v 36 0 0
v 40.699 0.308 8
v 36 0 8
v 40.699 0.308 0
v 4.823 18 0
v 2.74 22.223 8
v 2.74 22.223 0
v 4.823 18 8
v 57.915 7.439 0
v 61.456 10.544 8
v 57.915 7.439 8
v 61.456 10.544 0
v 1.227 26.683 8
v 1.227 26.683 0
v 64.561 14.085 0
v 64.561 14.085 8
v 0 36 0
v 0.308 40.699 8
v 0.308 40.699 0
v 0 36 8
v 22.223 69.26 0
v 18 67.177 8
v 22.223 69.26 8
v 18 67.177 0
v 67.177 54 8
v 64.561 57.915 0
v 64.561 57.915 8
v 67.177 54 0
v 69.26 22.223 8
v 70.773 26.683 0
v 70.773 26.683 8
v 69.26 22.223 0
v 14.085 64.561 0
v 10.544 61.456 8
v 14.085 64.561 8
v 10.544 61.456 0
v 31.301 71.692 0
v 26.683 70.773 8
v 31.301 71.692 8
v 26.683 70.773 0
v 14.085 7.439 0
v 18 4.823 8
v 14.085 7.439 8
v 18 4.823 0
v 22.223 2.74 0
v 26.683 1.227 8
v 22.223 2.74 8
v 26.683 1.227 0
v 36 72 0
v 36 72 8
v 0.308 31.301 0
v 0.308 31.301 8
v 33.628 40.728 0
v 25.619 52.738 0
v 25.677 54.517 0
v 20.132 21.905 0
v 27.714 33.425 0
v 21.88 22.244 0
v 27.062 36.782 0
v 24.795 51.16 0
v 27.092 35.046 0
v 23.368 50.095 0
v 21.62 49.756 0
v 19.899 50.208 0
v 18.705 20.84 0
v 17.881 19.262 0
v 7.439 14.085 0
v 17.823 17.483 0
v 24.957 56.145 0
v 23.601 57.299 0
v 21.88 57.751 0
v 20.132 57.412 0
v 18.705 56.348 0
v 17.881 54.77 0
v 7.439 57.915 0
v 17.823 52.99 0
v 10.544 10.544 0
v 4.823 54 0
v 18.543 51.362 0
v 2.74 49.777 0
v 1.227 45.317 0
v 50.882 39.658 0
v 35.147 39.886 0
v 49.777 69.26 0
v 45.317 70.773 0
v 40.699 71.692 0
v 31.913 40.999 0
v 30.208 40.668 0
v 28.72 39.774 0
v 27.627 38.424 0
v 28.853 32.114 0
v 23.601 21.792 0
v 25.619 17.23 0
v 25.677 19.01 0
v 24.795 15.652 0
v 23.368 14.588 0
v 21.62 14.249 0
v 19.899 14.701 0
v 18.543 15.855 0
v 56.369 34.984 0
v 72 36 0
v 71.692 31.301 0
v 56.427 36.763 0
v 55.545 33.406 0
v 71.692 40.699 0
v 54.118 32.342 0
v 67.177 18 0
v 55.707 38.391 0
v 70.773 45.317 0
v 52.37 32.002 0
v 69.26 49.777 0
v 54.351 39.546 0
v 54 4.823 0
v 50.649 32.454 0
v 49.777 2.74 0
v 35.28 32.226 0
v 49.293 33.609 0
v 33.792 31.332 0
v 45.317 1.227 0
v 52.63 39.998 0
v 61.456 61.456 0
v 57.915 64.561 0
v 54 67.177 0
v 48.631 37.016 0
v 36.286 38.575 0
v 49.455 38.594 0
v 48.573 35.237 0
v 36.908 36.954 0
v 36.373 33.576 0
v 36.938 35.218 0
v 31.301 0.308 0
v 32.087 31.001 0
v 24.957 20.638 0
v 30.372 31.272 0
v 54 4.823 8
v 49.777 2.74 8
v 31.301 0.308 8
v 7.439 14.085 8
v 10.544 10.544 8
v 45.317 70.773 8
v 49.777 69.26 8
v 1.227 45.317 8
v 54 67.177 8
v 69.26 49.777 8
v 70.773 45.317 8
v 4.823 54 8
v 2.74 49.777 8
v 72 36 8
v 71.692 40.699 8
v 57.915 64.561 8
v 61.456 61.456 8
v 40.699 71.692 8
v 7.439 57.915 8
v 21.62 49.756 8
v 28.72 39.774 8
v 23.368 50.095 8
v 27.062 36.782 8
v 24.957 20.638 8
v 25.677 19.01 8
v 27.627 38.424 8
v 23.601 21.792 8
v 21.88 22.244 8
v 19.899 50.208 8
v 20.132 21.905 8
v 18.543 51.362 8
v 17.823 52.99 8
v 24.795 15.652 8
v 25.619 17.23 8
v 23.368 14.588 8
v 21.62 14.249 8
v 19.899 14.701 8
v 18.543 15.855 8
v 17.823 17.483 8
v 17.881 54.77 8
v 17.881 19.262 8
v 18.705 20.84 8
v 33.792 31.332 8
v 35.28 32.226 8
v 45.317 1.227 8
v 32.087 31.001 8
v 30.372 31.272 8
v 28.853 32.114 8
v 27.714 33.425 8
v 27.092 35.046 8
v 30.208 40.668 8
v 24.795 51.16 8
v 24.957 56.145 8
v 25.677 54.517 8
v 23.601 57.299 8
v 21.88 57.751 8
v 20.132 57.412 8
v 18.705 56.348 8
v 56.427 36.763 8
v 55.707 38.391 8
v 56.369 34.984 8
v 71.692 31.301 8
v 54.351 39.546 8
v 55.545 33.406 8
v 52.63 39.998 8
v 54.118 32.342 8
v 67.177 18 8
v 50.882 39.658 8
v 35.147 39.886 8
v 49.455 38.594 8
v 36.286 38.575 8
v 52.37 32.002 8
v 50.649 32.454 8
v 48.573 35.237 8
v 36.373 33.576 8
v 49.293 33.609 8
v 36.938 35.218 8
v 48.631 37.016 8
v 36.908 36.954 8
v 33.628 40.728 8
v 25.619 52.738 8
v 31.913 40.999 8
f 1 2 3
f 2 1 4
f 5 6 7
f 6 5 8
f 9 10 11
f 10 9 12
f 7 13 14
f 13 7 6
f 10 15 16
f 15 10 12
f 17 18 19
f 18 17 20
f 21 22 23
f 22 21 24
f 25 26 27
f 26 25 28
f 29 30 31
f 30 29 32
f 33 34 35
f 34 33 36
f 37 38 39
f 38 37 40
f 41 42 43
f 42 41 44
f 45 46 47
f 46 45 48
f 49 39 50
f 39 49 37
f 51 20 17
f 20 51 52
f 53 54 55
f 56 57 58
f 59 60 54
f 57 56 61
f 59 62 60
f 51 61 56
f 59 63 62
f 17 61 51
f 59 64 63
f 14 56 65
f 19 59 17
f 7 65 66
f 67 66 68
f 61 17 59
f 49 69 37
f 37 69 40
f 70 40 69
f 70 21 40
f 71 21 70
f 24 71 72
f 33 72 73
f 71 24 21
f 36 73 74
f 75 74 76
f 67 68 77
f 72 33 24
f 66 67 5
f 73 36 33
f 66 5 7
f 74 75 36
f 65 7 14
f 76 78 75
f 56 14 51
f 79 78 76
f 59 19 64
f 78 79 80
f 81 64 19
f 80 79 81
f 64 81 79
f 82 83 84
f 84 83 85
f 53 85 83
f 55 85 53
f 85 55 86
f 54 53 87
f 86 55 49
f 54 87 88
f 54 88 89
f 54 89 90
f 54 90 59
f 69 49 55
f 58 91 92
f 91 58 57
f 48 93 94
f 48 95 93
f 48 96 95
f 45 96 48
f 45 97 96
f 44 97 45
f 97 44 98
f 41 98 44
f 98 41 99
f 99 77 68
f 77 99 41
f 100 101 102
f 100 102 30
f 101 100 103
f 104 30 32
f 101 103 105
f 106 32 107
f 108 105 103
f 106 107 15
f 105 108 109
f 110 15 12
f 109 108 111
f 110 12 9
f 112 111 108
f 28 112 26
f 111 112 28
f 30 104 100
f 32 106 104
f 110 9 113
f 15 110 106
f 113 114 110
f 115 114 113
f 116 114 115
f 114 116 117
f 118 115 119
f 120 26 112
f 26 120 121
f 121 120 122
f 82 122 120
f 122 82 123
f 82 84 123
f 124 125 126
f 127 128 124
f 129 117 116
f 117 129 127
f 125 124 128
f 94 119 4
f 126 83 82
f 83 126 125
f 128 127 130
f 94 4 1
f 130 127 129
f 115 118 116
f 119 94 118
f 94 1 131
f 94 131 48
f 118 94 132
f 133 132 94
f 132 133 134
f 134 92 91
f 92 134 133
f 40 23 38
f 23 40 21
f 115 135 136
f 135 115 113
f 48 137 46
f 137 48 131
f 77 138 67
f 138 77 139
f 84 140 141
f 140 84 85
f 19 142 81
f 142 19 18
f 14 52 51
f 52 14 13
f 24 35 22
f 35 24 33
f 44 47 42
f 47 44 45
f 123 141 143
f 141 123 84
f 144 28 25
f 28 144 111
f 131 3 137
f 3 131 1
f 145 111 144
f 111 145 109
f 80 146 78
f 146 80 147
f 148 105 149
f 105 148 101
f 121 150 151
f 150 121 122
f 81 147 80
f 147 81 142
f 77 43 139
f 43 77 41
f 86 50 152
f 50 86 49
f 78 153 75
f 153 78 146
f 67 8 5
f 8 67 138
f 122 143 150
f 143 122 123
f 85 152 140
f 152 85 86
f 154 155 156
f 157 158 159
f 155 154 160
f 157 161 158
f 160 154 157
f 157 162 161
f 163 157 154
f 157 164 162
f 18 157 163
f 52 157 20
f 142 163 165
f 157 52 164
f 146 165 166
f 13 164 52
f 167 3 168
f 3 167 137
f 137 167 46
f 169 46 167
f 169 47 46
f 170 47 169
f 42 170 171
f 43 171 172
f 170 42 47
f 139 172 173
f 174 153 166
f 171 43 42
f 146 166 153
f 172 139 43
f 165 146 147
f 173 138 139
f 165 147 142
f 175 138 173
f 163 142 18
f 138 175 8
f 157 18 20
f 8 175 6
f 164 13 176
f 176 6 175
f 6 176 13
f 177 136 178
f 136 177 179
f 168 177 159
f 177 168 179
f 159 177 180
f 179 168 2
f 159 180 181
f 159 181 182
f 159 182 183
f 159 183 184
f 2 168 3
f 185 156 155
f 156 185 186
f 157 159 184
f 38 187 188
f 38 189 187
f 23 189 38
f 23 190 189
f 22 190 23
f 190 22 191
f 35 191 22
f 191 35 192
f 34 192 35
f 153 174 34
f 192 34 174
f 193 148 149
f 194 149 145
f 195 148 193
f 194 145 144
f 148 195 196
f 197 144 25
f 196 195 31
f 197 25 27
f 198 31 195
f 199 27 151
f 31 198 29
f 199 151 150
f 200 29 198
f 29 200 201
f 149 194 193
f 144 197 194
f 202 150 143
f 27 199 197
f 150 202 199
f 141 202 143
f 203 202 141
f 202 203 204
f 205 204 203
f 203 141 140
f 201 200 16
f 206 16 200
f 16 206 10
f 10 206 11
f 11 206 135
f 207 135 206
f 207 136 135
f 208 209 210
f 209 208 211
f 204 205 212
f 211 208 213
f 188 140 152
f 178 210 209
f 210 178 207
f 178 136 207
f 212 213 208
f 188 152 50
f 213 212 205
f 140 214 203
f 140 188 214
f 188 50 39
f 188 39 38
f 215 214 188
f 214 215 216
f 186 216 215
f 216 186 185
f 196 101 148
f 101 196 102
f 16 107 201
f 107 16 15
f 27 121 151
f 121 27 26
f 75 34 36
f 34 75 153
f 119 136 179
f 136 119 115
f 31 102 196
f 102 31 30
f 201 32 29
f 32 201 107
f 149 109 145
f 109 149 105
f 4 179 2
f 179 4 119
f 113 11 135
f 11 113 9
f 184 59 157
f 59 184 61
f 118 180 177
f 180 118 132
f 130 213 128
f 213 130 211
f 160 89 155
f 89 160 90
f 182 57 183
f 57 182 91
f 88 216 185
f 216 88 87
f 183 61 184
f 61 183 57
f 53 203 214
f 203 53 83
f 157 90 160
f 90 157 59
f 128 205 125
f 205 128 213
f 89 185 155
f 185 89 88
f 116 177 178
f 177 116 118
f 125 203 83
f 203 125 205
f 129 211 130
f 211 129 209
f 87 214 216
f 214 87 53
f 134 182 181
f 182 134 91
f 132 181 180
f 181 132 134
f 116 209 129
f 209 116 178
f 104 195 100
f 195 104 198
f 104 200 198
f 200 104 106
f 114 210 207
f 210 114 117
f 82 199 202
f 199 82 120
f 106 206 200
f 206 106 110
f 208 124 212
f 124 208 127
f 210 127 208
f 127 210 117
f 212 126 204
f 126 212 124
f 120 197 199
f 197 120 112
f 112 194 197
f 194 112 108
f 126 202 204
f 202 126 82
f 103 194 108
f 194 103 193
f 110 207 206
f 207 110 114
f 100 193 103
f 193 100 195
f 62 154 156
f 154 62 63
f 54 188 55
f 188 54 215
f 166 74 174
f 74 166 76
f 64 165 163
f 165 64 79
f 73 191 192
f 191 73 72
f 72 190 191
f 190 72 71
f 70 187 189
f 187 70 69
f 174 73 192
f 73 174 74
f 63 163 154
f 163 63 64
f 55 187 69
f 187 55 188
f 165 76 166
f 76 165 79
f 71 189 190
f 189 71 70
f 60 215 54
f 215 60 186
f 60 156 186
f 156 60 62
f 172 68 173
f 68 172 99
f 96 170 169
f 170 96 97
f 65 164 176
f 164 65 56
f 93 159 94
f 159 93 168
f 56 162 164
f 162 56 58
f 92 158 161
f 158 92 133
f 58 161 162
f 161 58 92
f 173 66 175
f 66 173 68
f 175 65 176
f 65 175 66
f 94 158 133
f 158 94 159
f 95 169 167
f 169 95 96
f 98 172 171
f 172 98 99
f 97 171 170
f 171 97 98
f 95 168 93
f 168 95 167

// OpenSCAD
$fn = 32;

// ----------------------------------------------------------------------
// Cam plate: eccentric cam, base R36
// ----------------------------------------------------------------------

// --- parameters (mm) ---
base_r = 36;              // base circle radius
lobe_h = 14;              // cam lobe rise
bore_r = 5;               // shaft bore radius
plate_t = 8;              // plate thickness, Z (extrusion height)
ecc = 4;                  // disc eccentricity
ring_r = 20.5;            // lightening ring radius
bolt_r = 4;               // lightening hole radius

profile = [[72, 36], [71.692, 40.699], [70.773, 45.317], [69.26, 49.777], [67.177, 54], [64.561, 57.915], [61.456, 61.456], [57.915, 64.561], [54, 67.177], [49.777, 69.26], [45.317, 70.773], [40.699, 71.692], [36, 72], [31.301, 71.692], [26.683, 70.773], [22.223, 69.26], [18, 67.177], [14.085, 64.561], [10.544, 61.456], [7.439, 57.915], [4.823, 54], [2.74, 49.777], [1.227, 45.317], [0.308, 40.699], [0, 36], [0.308, 31.301], [1.227, 26.683], [2.74, 22.223], [4.823, 18], [7.439, 14.085], [10.544, 10.544], [14.085, 7.439], [18, 4.823], [22.223, 2.74], [26.683, 1.227], [31.301, 0.308], [36, 0], [40.699, 0.308], [45.317, 1.227], [49.777, 2.74], [54, 4.823], [57.915, 7.439], [61.456, 10.544], [64.561, 14.085], [67.177, 18], [69.26, 22.223], [70.773, 26.683], [71.692, 31.301]];  // primary outline, 48 points, counter clockwise
void_1 = [[36.908, 36.954], [36.286, 38.575], [35.147, 39.886], [33.628, 40.728], [31.913, 40.999], [30.208, 40.668], [28.72, 39.774], [27.627, 38.424], [27.062, 36.782], [27.092, 35.046], [27.714, 33.425], [28.853, 32.114], [30.372, 31.272], [32.087, 31.001], [33.792, 31.332], [35.28, 32.226], [36.373, 33.576], [36.938, 35.218]];  // shaft bore, 18 points
void_2 = [[56.427, 36.763], [55.707, 38.391], [54.351, 39.546], [52.63, 39.998], [50.882, 39.658], [49.455, 38.594], [48.631, 37.016], [48.573, 35.237], [49.293, 33.609], [50.649, 32.454], [52.37, 32.002], [54.118, 32.342], [55.545, 33.406], [56.369, 34.984]];  // lightening hole 1, 14 points
void_3 = [[25.677, 54.517], [24.957, 56.145], [23.601, 57.299], [21.88, 57.751], [20.132, 57.412], [18.705, 56.348], [17.881, 54.77], [17.823, 52.99], [18.543, 51.362], [19.899, 50.208], [21.62, 49.756], [23.368, 50.095], [24.795, 51.16], [25.619, 52.738]];  // lightening hole 2, 14 points
void_4 = [[25.677, 19.01], [24.957, 20.638], [23.601, 21.792], [21.88, 22.244], [20.132, 21.905], [18.705, 20.84], [17.881, 19.262], [17.823, 17.483], [18.543, 15.855], [19.899, 14.701], [21.62, 14.249], [23.368, 14.588], [24.795, 15.652], [25.619, 17.23]];  // lightening hole 3, 14 points

// --- the one profile operation ---
difference() {
  linear_extrude(height = plate_t) polygon(points = profile);
  translate([0, 0, -1])
    linear_extrude(height = plate_t + 2) polygon(points = void_1);
  translate([0, 0, -1])
    linear_extrude(height = plate_t + 2) polygon(points = void_2);
  translate([0, 0, -1])
    linear_extrude(height = plate_t + 2) polygon(points = void_3);
  translate([0, 0, -1])
    linear_extrude(height = plate_t + 2) polygon(points = void_4);
}
